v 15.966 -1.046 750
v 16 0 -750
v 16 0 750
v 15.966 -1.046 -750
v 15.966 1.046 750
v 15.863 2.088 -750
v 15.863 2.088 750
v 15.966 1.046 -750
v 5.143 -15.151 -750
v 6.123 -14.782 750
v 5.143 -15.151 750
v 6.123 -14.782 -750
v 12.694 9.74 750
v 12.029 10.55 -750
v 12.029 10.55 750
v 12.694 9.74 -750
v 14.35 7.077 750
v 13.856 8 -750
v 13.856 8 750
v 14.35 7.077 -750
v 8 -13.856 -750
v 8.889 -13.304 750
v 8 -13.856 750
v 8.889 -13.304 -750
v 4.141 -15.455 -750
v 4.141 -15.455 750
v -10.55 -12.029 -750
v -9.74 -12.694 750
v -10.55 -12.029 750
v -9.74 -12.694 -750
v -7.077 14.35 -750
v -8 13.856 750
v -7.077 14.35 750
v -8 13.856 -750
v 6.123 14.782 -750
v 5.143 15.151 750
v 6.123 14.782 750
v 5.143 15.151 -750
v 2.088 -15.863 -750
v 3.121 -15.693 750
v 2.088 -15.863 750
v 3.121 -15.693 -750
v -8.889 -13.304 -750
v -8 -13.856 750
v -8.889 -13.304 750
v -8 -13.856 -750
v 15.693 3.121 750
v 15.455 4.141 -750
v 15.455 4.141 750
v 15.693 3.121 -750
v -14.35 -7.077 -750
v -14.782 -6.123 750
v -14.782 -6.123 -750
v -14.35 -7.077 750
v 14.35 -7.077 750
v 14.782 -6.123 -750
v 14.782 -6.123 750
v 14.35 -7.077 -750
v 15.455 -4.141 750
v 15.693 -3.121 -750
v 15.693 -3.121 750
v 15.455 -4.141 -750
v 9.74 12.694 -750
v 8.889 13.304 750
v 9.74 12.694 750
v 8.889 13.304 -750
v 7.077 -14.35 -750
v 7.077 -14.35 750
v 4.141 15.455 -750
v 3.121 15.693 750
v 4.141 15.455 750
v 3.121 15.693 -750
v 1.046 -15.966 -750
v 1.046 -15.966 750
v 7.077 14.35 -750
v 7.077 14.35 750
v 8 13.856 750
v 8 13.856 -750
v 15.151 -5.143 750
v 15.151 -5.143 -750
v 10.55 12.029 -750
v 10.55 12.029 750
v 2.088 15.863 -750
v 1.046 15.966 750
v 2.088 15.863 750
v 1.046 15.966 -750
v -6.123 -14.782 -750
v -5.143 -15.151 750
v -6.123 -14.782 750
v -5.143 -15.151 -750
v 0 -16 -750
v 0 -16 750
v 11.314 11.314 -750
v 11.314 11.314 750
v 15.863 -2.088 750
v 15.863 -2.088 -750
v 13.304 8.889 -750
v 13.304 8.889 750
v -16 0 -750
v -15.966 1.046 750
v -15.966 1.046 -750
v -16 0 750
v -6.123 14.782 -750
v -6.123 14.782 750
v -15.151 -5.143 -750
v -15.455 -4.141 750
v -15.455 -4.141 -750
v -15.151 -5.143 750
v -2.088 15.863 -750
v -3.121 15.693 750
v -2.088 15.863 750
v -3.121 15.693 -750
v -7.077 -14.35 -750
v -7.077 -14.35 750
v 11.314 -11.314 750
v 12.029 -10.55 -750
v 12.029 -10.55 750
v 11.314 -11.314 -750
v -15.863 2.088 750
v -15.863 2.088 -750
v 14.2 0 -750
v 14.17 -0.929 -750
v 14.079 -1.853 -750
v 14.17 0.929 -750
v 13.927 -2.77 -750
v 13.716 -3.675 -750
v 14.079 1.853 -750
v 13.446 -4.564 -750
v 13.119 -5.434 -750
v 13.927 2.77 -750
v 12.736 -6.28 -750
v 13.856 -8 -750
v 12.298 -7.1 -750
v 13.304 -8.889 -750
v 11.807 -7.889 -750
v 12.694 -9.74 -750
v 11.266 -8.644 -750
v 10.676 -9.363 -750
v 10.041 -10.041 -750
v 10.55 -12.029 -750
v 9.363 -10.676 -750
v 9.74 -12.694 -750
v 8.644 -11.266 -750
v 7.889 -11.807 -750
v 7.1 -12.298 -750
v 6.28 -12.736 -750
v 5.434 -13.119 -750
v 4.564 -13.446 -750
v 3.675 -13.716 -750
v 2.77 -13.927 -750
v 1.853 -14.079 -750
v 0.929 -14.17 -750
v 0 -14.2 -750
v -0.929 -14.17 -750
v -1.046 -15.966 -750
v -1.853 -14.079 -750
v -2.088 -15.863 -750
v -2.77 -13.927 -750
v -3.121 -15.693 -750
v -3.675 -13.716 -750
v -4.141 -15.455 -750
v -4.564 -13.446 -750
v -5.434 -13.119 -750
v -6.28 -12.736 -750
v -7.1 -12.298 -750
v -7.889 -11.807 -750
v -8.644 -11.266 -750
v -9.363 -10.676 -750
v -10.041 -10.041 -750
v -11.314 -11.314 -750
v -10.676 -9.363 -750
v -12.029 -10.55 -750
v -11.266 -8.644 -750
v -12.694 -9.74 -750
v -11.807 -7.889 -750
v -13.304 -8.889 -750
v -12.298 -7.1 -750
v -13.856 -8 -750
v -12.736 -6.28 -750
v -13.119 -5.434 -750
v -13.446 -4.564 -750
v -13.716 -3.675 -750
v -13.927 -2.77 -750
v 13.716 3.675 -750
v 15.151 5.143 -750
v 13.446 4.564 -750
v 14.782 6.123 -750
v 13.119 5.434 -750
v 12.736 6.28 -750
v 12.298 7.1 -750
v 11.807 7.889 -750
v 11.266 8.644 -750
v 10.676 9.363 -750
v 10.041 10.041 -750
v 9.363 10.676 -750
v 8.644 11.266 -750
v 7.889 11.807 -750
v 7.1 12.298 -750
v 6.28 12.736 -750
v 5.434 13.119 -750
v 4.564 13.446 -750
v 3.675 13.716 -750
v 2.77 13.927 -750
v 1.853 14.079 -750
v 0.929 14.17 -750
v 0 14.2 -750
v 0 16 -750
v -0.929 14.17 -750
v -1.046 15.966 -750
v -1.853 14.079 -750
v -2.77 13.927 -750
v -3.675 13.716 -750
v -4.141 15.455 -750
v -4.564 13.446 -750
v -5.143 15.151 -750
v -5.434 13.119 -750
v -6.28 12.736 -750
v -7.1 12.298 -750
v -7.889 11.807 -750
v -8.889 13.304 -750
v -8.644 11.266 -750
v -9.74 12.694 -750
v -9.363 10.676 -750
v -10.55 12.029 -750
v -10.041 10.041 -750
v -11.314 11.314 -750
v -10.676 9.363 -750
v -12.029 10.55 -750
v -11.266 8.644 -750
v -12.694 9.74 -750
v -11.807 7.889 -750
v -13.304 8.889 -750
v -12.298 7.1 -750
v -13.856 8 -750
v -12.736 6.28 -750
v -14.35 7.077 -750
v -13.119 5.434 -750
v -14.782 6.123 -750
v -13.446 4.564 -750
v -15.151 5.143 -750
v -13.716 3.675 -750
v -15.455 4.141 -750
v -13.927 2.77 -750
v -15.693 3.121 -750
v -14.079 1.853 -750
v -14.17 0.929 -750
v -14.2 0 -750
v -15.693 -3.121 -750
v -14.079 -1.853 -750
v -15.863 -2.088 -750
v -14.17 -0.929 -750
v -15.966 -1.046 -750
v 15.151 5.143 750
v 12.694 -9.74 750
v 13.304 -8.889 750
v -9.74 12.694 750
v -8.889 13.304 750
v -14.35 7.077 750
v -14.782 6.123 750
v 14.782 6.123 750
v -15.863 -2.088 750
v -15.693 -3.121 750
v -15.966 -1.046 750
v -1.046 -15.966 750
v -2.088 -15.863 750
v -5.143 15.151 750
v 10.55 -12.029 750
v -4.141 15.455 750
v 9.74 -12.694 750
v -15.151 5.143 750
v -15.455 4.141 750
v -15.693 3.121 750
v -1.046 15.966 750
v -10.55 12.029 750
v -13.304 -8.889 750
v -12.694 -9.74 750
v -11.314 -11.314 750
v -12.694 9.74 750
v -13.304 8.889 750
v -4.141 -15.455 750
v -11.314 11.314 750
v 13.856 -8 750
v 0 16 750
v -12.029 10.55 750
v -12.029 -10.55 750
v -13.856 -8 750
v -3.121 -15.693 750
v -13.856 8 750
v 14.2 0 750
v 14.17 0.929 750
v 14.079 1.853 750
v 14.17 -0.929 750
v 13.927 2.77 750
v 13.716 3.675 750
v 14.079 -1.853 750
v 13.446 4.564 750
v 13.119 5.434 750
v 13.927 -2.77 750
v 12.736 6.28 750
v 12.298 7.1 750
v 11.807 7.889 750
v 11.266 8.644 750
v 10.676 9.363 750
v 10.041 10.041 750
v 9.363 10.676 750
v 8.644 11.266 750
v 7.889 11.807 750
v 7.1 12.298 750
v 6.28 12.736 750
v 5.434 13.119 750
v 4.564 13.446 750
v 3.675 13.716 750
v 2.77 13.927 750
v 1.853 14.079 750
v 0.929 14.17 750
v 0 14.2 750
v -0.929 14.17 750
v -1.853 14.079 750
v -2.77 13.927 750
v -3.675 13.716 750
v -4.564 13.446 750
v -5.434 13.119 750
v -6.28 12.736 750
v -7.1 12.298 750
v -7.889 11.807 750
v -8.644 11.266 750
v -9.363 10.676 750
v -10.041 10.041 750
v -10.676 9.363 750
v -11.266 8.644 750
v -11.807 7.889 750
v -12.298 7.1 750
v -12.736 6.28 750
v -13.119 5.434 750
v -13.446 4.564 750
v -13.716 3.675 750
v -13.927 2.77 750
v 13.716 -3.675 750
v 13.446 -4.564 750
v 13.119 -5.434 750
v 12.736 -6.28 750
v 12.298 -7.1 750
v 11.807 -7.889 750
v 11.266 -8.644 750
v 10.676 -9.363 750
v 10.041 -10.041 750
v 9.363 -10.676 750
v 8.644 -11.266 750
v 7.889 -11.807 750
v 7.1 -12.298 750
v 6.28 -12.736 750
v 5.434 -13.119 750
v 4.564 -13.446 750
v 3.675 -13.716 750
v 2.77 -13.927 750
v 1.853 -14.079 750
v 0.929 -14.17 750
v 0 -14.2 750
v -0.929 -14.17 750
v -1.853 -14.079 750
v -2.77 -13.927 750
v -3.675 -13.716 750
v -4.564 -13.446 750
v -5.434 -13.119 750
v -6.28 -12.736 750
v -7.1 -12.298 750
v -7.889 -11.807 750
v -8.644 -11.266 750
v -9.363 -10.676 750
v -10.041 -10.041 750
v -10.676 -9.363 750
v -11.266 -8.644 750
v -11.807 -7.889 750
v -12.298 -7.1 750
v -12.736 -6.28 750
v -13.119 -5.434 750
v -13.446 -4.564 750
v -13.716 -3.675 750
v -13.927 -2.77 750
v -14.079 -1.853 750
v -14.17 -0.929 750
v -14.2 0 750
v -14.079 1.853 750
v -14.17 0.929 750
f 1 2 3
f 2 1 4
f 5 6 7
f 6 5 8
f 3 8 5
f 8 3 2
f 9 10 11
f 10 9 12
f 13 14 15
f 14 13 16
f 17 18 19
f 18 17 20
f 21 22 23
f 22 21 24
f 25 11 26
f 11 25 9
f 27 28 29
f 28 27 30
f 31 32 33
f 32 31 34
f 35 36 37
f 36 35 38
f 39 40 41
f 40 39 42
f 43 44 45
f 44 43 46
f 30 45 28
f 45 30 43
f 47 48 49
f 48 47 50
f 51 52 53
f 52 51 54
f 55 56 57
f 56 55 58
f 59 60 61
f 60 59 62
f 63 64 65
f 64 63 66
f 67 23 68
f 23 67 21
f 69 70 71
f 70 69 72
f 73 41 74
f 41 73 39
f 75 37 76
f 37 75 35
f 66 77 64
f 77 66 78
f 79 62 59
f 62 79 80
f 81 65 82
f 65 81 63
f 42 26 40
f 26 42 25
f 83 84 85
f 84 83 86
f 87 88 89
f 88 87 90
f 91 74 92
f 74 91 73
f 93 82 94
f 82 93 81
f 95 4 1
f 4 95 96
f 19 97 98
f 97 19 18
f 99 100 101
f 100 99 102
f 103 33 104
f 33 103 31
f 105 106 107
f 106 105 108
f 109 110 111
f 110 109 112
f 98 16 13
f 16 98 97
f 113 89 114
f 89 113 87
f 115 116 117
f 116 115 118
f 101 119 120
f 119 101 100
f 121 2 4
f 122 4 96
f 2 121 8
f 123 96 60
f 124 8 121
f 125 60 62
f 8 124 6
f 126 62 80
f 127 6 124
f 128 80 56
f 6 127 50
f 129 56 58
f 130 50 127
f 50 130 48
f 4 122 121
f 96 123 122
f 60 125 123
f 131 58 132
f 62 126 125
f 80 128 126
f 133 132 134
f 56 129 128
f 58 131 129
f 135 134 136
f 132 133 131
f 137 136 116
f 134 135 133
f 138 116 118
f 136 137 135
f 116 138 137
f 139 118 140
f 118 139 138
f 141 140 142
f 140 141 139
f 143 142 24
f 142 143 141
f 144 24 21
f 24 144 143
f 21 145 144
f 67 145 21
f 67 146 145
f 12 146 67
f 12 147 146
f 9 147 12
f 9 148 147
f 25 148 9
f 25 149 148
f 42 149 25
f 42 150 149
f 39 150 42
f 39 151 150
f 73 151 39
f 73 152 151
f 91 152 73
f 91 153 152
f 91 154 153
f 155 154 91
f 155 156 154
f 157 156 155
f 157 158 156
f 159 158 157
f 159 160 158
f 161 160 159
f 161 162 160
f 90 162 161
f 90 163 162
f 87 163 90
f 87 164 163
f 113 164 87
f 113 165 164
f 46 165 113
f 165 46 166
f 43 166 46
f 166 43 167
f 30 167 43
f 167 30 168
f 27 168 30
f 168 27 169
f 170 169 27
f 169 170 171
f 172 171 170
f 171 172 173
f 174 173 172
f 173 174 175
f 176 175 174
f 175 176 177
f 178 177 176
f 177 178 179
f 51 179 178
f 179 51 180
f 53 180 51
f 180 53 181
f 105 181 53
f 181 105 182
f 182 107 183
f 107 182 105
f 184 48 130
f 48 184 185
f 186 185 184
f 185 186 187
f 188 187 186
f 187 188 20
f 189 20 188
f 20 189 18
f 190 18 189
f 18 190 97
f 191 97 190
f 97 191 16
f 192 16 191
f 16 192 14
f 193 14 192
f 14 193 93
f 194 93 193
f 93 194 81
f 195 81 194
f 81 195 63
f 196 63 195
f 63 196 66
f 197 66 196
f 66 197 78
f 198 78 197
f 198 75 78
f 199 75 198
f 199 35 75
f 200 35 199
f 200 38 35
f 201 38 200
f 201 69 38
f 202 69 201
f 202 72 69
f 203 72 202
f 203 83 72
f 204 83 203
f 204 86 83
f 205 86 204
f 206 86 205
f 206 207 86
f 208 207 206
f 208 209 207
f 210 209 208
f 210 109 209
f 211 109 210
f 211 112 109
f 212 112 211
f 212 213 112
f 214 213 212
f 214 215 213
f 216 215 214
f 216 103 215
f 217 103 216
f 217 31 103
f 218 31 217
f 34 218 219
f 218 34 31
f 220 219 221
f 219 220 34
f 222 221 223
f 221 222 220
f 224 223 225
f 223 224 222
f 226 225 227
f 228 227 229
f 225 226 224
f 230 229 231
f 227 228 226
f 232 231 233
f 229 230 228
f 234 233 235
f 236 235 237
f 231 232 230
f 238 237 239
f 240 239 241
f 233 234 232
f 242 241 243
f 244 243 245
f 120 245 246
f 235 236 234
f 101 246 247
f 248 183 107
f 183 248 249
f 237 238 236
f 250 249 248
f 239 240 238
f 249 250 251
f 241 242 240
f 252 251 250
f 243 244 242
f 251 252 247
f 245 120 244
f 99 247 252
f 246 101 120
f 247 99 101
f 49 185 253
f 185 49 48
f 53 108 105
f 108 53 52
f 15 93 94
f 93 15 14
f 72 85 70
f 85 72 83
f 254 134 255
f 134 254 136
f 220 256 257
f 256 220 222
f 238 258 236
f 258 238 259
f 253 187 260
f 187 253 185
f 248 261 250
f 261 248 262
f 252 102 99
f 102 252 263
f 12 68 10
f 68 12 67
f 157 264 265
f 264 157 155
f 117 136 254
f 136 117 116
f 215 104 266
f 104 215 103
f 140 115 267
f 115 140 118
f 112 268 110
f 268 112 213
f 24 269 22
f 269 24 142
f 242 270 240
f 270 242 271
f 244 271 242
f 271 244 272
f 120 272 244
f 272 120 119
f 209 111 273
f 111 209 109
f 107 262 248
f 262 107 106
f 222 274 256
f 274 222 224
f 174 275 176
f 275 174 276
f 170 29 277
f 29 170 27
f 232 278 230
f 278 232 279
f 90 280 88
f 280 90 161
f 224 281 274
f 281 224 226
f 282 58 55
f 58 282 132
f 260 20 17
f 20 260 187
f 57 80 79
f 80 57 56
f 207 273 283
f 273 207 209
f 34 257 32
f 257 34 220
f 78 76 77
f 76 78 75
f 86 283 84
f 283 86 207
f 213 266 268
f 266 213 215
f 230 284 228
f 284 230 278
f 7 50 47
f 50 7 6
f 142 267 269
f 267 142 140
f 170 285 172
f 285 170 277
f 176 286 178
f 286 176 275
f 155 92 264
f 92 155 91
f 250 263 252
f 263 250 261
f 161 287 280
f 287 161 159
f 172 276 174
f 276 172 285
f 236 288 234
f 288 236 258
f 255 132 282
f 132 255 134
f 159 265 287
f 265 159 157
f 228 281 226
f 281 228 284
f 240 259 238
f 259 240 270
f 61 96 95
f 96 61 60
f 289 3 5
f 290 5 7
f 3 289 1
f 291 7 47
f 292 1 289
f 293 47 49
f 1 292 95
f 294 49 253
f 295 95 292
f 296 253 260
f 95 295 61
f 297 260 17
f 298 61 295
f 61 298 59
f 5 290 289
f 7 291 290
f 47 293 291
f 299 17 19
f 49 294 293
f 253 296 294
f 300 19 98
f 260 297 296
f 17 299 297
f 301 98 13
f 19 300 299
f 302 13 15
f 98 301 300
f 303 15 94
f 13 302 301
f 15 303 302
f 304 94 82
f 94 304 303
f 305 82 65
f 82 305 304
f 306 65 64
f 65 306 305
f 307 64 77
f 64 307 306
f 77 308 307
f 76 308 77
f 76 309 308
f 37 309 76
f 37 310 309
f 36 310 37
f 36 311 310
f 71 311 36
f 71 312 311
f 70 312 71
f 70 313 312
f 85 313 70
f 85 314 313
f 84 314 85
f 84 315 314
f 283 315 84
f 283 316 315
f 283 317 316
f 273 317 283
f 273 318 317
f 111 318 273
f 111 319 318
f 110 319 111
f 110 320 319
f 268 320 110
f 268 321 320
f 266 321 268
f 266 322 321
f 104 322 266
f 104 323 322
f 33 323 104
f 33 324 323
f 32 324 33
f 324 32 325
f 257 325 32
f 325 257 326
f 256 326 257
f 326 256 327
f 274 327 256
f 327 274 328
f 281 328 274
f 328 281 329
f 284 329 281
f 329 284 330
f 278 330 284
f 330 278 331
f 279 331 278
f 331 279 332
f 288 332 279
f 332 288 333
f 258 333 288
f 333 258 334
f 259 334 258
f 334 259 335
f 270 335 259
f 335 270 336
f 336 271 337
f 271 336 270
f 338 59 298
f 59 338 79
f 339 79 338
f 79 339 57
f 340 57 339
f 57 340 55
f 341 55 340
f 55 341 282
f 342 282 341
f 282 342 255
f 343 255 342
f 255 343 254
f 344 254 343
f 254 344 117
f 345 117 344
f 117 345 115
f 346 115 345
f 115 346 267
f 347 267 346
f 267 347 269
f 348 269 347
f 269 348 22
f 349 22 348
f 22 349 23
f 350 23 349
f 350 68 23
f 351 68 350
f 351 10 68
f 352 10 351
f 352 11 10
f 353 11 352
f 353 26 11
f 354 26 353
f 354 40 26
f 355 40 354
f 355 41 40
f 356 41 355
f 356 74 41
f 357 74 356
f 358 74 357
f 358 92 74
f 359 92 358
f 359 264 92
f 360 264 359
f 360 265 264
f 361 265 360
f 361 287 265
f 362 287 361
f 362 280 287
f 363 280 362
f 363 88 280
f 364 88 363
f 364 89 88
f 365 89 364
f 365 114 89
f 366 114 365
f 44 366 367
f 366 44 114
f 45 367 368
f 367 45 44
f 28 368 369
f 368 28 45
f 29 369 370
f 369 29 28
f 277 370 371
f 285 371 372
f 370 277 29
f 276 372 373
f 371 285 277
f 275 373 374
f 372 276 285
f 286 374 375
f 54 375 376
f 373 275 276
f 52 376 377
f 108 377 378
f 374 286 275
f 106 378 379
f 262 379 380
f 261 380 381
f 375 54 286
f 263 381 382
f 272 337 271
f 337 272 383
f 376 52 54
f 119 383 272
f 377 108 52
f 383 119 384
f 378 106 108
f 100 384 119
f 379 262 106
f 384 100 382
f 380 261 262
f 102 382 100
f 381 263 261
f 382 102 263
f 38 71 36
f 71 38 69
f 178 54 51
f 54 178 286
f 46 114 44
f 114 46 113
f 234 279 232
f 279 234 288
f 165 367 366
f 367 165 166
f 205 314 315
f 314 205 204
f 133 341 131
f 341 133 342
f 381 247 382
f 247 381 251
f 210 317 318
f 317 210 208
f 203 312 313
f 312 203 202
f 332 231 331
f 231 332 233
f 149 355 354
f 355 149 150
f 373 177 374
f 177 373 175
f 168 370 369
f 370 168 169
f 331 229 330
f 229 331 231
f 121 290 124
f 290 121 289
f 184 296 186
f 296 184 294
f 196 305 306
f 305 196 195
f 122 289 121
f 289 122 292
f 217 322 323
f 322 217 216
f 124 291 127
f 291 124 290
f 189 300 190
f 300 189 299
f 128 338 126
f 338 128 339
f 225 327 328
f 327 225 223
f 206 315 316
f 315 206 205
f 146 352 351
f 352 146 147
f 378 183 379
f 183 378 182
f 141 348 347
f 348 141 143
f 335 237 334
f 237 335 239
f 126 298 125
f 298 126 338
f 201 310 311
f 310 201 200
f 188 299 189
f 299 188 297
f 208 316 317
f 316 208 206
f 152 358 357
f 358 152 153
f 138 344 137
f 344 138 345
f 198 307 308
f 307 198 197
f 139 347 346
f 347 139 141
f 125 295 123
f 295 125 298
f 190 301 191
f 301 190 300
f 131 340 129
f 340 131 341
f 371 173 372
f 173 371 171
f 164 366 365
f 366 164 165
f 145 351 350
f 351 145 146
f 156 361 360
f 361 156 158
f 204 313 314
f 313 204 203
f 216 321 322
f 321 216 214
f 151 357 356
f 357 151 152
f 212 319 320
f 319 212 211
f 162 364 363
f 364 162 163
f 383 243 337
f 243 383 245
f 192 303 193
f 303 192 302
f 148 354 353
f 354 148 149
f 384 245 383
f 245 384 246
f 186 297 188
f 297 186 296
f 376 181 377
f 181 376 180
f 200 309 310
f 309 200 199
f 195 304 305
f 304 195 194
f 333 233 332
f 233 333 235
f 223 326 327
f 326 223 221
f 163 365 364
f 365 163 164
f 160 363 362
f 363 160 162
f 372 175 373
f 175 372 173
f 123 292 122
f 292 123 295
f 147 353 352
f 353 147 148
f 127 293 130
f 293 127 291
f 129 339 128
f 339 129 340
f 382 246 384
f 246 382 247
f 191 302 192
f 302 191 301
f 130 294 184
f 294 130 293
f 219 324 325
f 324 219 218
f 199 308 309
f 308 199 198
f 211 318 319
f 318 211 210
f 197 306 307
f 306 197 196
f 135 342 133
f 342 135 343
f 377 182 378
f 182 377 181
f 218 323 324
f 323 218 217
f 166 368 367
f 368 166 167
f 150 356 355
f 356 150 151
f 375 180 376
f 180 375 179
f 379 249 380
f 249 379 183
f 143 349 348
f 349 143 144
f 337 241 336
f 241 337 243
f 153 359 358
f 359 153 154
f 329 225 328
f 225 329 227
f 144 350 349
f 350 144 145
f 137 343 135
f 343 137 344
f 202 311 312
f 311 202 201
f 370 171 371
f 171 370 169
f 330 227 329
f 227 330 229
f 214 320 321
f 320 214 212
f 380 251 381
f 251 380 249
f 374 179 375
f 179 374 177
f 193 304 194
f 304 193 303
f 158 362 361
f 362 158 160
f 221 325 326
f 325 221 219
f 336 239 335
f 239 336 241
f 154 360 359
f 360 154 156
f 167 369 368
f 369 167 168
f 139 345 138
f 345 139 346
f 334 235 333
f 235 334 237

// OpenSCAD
$fn=96;

module ht_pipe(od=32, wall=1.8, length=1500) {
    difference() {
        cylinder(h=length, d=od, center=true);
        cylinder(h=length+2, d=od-2*wall, center=true);
    }
}

ht_pipe(od=32, wall=1.8, length=1500);
